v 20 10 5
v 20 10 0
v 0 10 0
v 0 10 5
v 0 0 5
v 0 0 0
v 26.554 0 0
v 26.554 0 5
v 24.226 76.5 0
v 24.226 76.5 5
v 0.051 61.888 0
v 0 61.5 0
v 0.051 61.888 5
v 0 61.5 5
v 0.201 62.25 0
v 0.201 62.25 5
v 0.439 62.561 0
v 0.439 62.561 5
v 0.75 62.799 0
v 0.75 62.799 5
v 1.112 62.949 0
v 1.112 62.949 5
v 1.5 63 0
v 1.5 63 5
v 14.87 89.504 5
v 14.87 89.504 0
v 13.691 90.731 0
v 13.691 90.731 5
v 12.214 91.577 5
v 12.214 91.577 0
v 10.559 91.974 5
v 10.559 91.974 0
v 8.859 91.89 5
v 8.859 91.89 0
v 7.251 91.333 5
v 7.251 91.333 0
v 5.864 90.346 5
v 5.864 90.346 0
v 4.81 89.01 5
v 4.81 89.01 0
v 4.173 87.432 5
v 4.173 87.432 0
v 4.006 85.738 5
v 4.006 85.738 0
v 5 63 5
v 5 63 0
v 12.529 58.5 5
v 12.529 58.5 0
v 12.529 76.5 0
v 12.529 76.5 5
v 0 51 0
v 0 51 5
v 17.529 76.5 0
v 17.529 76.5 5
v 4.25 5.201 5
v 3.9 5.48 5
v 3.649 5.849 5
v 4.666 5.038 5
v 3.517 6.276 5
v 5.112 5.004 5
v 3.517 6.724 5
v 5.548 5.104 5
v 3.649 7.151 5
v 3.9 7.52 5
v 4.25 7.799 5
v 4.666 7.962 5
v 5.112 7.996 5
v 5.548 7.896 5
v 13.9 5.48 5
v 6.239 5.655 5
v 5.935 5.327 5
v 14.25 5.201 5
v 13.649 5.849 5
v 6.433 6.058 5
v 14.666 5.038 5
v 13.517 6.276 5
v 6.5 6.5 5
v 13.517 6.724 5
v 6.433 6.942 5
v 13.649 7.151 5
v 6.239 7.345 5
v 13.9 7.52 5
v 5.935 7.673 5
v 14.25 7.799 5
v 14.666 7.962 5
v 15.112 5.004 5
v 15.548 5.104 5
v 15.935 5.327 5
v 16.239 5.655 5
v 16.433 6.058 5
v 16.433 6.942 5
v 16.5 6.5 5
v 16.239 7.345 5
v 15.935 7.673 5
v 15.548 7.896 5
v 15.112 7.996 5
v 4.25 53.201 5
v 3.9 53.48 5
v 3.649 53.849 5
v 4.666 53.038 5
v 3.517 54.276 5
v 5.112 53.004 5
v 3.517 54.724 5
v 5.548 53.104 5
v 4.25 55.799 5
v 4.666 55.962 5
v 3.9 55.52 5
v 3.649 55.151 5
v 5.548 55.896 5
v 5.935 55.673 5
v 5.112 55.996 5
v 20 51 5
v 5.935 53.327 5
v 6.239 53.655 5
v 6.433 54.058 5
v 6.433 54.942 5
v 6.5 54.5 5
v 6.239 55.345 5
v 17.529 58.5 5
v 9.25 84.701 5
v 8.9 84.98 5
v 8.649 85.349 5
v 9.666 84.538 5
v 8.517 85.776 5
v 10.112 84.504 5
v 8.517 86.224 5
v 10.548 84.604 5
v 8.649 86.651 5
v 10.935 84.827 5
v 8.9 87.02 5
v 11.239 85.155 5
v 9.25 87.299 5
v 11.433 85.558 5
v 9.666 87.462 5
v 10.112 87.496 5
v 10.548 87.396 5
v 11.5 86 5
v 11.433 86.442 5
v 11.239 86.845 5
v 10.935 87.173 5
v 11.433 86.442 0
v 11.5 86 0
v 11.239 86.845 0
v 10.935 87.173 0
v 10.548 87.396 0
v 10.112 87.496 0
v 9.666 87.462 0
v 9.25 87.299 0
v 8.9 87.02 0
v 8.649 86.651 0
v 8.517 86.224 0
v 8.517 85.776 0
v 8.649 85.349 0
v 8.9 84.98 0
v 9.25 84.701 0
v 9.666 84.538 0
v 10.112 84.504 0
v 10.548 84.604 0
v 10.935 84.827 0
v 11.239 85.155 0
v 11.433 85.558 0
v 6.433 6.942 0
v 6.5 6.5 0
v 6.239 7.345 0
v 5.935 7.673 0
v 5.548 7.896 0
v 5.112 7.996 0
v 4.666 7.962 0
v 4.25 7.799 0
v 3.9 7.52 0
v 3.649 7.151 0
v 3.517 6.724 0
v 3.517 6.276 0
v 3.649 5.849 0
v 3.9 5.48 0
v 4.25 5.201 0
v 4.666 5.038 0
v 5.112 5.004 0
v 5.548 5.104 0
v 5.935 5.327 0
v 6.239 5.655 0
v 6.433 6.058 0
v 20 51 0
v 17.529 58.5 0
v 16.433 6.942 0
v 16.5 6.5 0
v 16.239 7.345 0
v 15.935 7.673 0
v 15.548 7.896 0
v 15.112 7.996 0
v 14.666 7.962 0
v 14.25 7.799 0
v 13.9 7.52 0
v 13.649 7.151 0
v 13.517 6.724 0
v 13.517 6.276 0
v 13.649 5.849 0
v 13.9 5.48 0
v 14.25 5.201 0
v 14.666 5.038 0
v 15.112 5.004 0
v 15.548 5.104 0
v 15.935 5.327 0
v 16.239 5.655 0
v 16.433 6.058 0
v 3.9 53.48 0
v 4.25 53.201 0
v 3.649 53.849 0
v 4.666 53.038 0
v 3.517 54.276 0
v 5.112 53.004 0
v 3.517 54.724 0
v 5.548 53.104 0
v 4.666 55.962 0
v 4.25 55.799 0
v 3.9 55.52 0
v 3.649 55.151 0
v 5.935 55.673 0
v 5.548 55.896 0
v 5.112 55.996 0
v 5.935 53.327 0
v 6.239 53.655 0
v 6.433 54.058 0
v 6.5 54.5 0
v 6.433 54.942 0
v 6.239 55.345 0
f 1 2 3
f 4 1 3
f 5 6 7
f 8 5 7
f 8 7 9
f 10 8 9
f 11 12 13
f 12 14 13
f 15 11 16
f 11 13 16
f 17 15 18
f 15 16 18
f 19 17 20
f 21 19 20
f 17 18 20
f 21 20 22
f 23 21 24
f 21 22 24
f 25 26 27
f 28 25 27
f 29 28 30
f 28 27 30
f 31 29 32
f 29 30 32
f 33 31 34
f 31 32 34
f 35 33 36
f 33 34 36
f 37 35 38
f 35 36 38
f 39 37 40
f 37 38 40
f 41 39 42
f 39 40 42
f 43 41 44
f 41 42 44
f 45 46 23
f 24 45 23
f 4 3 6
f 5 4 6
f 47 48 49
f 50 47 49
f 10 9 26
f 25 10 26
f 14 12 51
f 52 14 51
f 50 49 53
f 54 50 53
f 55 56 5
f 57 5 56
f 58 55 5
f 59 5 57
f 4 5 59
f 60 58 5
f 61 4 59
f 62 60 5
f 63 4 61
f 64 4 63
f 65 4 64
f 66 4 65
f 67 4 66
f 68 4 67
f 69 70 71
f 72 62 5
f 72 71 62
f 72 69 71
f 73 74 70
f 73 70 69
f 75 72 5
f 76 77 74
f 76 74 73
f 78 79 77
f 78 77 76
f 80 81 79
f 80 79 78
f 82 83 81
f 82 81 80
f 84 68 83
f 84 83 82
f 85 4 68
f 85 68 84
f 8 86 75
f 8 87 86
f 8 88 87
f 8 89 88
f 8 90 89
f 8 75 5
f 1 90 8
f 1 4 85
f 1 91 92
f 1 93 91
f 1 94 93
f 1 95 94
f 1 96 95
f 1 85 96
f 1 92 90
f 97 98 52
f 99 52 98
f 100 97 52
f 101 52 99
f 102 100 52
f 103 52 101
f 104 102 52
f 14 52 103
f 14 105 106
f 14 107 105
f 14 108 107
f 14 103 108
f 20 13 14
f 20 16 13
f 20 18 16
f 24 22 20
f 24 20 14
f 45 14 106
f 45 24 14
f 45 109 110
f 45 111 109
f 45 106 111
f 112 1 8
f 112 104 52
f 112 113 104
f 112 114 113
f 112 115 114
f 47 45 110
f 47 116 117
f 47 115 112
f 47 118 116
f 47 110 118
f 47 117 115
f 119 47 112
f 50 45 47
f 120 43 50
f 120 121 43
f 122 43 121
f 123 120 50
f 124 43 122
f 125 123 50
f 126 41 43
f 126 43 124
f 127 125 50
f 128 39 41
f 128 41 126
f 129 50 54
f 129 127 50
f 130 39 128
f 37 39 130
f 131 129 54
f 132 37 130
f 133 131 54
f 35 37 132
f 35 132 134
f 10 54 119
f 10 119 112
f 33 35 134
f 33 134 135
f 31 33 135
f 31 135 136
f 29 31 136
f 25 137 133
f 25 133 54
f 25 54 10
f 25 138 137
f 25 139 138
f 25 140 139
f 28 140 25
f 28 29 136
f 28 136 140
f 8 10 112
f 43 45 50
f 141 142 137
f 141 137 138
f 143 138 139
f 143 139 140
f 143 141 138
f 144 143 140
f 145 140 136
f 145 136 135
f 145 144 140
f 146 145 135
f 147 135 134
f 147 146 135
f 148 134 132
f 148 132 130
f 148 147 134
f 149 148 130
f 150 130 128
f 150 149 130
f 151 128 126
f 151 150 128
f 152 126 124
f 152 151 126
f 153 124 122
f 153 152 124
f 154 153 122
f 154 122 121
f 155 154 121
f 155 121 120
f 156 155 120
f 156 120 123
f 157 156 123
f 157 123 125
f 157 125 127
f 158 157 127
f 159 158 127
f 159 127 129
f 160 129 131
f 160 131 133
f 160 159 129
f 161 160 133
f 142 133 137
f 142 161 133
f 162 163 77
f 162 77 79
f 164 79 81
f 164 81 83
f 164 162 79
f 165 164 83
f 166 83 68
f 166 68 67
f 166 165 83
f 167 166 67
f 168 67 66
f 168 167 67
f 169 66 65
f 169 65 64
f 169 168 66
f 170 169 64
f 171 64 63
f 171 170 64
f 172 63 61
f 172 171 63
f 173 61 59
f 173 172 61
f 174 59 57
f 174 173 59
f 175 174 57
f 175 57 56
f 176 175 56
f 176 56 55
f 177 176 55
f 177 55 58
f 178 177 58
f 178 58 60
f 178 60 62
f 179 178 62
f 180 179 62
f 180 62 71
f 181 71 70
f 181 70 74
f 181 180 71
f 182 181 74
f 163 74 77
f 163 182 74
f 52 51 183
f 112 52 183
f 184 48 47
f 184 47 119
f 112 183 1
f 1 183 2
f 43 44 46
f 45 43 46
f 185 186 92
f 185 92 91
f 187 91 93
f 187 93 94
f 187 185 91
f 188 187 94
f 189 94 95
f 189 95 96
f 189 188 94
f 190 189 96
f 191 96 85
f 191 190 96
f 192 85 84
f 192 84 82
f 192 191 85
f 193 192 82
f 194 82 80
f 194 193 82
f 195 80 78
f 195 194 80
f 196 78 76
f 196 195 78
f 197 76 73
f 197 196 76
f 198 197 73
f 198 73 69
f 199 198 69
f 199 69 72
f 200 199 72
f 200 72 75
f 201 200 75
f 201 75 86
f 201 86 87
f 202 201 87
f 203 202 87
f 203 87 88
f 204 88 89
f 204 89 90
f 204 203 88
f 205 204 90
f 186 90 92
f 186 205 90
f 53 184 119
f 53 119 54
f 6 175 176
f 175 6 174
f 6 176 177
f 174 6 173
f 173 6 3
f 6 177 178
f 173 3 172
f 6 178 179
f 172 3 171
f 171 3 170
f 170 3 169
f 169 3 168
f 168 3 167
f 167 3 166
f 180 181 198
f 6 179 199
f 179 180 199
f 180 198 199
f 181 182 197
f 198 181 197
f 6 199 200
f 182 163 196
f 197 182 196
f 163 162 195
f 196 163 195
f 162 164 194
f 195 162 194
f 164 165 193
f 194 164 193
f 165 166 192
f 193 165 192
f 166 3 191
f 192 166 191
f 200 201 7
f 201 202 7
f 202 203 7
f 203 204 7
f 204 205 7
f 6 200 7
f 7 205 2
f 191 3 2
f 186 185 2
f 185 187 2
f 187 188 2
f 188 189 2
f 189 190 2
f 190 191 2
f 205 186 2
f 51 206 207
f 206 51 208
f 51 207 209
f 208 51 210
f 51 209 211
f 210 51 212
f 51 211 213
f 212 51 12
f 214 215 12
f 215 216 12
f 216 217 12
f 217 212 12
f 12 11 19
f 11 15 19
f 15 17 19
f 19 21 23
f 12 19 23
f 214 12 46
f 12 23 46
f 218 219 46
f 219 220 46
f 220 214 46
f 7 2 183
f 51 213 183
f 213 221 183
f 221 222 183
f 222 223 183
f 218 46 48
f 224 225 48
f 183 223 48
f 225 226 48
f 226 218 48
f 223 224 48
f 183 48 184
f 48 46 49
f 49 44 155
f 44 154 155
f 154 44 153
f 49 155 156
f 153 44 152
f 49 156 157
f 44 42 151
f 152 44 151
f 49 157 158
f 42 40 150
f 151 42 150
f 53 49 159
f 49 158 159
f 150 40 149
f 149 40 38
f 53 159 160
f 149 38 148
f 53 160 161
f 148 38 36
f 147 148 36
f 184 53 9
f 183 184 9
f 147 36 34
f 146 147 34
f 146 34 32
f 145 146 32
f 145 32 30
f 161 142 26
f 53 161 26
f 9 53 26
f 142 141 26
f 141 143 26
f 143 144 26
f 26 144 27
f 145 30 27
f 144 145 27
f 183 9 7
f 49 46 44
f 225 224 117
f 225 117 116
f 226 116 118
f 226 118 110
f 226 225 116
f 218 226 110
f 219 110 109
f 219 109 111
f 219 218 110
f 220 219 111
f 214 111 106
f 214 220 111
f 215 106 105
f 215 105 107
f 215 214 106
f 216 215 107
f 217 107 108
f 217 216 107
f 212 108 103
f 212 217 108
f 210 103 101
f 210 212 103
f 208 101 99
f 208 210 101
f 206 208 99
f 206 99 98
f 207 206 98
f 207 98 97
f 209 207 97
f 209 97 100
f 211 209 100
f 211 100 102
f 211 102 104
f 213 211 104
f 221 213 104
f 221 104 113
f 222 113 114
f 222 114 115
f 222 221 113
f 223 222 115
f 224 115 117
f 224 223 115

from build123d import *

# Parameters (mm, degrees)
ESQUISSE1_R        = 1.5
ESQUISSE1_W        = 5
ESQUISSE1_H        = 18
BOSS_EXTRU_1_DEPTH = 5
CONG_3_R           = 1.5


with BuildPart() as part:
    # Esquisse1 → Boss.-Extru.1 (new body)
    with BuildSketch(Plane.XY):
        with BuildLine():
            Line((0, 10), (0, 0))
            Line((0, 0), (26.554131445, 0))
            Line((26.554131445, 0), (24.226405413, 76.5))
            Line((24.226405413, 76.5), (14.870448313, 89.504102342))
            ThreePointArc((14.870448313, 89.504102342), (8.034842814, 91.669052587), (4.005728082, 85.7378852))
            Line((4.005728082, 85.7378852), (5, 63))
            Line((5, 63), (0, 63))
            Line((0, 63), (0, 51))
            Line((0, 51), (11, 51))
            Line((11, 51), (20, 51))
            Line((20, 51), (20, 10))
            Line((20, 10), (11, 10))
            Line((11, 10), (0, 10))
        make_face()
        with Locations((5, 54.5)):
            Circle(ESQUISSE1_R, mode=Mode.SUBTRACT)
        with Locations((15, 6.5)):
            Circle(ESQUISSE1_R, mode=Mode.SUBTRACT)
        with Locations((5, 6.5)):
            Circle(ESQUISSE1_R, mode=Mode.SUBTRACT)
        with Locations((10, 86)):
            Circle(ESQUISSE1_R, mode=Mode.SUBTRACT)
        with Locations((15.02885683, 67.5)):
            Rectangle(ESQUISSE1_W, ESQUISSE1_H, mode=Mode.SUBTRACT)
    extrude(amount=BOSS_EXTRU_1_DEPTH)

    # Congé3
    cong_3_edges = [part.edges().sort_by_distance(p)[0] for p in [
        (0, 63, 2.5),
    ]]
    fillet(cong_3_edges, radius=CONG_3_R)


solid = part.part
